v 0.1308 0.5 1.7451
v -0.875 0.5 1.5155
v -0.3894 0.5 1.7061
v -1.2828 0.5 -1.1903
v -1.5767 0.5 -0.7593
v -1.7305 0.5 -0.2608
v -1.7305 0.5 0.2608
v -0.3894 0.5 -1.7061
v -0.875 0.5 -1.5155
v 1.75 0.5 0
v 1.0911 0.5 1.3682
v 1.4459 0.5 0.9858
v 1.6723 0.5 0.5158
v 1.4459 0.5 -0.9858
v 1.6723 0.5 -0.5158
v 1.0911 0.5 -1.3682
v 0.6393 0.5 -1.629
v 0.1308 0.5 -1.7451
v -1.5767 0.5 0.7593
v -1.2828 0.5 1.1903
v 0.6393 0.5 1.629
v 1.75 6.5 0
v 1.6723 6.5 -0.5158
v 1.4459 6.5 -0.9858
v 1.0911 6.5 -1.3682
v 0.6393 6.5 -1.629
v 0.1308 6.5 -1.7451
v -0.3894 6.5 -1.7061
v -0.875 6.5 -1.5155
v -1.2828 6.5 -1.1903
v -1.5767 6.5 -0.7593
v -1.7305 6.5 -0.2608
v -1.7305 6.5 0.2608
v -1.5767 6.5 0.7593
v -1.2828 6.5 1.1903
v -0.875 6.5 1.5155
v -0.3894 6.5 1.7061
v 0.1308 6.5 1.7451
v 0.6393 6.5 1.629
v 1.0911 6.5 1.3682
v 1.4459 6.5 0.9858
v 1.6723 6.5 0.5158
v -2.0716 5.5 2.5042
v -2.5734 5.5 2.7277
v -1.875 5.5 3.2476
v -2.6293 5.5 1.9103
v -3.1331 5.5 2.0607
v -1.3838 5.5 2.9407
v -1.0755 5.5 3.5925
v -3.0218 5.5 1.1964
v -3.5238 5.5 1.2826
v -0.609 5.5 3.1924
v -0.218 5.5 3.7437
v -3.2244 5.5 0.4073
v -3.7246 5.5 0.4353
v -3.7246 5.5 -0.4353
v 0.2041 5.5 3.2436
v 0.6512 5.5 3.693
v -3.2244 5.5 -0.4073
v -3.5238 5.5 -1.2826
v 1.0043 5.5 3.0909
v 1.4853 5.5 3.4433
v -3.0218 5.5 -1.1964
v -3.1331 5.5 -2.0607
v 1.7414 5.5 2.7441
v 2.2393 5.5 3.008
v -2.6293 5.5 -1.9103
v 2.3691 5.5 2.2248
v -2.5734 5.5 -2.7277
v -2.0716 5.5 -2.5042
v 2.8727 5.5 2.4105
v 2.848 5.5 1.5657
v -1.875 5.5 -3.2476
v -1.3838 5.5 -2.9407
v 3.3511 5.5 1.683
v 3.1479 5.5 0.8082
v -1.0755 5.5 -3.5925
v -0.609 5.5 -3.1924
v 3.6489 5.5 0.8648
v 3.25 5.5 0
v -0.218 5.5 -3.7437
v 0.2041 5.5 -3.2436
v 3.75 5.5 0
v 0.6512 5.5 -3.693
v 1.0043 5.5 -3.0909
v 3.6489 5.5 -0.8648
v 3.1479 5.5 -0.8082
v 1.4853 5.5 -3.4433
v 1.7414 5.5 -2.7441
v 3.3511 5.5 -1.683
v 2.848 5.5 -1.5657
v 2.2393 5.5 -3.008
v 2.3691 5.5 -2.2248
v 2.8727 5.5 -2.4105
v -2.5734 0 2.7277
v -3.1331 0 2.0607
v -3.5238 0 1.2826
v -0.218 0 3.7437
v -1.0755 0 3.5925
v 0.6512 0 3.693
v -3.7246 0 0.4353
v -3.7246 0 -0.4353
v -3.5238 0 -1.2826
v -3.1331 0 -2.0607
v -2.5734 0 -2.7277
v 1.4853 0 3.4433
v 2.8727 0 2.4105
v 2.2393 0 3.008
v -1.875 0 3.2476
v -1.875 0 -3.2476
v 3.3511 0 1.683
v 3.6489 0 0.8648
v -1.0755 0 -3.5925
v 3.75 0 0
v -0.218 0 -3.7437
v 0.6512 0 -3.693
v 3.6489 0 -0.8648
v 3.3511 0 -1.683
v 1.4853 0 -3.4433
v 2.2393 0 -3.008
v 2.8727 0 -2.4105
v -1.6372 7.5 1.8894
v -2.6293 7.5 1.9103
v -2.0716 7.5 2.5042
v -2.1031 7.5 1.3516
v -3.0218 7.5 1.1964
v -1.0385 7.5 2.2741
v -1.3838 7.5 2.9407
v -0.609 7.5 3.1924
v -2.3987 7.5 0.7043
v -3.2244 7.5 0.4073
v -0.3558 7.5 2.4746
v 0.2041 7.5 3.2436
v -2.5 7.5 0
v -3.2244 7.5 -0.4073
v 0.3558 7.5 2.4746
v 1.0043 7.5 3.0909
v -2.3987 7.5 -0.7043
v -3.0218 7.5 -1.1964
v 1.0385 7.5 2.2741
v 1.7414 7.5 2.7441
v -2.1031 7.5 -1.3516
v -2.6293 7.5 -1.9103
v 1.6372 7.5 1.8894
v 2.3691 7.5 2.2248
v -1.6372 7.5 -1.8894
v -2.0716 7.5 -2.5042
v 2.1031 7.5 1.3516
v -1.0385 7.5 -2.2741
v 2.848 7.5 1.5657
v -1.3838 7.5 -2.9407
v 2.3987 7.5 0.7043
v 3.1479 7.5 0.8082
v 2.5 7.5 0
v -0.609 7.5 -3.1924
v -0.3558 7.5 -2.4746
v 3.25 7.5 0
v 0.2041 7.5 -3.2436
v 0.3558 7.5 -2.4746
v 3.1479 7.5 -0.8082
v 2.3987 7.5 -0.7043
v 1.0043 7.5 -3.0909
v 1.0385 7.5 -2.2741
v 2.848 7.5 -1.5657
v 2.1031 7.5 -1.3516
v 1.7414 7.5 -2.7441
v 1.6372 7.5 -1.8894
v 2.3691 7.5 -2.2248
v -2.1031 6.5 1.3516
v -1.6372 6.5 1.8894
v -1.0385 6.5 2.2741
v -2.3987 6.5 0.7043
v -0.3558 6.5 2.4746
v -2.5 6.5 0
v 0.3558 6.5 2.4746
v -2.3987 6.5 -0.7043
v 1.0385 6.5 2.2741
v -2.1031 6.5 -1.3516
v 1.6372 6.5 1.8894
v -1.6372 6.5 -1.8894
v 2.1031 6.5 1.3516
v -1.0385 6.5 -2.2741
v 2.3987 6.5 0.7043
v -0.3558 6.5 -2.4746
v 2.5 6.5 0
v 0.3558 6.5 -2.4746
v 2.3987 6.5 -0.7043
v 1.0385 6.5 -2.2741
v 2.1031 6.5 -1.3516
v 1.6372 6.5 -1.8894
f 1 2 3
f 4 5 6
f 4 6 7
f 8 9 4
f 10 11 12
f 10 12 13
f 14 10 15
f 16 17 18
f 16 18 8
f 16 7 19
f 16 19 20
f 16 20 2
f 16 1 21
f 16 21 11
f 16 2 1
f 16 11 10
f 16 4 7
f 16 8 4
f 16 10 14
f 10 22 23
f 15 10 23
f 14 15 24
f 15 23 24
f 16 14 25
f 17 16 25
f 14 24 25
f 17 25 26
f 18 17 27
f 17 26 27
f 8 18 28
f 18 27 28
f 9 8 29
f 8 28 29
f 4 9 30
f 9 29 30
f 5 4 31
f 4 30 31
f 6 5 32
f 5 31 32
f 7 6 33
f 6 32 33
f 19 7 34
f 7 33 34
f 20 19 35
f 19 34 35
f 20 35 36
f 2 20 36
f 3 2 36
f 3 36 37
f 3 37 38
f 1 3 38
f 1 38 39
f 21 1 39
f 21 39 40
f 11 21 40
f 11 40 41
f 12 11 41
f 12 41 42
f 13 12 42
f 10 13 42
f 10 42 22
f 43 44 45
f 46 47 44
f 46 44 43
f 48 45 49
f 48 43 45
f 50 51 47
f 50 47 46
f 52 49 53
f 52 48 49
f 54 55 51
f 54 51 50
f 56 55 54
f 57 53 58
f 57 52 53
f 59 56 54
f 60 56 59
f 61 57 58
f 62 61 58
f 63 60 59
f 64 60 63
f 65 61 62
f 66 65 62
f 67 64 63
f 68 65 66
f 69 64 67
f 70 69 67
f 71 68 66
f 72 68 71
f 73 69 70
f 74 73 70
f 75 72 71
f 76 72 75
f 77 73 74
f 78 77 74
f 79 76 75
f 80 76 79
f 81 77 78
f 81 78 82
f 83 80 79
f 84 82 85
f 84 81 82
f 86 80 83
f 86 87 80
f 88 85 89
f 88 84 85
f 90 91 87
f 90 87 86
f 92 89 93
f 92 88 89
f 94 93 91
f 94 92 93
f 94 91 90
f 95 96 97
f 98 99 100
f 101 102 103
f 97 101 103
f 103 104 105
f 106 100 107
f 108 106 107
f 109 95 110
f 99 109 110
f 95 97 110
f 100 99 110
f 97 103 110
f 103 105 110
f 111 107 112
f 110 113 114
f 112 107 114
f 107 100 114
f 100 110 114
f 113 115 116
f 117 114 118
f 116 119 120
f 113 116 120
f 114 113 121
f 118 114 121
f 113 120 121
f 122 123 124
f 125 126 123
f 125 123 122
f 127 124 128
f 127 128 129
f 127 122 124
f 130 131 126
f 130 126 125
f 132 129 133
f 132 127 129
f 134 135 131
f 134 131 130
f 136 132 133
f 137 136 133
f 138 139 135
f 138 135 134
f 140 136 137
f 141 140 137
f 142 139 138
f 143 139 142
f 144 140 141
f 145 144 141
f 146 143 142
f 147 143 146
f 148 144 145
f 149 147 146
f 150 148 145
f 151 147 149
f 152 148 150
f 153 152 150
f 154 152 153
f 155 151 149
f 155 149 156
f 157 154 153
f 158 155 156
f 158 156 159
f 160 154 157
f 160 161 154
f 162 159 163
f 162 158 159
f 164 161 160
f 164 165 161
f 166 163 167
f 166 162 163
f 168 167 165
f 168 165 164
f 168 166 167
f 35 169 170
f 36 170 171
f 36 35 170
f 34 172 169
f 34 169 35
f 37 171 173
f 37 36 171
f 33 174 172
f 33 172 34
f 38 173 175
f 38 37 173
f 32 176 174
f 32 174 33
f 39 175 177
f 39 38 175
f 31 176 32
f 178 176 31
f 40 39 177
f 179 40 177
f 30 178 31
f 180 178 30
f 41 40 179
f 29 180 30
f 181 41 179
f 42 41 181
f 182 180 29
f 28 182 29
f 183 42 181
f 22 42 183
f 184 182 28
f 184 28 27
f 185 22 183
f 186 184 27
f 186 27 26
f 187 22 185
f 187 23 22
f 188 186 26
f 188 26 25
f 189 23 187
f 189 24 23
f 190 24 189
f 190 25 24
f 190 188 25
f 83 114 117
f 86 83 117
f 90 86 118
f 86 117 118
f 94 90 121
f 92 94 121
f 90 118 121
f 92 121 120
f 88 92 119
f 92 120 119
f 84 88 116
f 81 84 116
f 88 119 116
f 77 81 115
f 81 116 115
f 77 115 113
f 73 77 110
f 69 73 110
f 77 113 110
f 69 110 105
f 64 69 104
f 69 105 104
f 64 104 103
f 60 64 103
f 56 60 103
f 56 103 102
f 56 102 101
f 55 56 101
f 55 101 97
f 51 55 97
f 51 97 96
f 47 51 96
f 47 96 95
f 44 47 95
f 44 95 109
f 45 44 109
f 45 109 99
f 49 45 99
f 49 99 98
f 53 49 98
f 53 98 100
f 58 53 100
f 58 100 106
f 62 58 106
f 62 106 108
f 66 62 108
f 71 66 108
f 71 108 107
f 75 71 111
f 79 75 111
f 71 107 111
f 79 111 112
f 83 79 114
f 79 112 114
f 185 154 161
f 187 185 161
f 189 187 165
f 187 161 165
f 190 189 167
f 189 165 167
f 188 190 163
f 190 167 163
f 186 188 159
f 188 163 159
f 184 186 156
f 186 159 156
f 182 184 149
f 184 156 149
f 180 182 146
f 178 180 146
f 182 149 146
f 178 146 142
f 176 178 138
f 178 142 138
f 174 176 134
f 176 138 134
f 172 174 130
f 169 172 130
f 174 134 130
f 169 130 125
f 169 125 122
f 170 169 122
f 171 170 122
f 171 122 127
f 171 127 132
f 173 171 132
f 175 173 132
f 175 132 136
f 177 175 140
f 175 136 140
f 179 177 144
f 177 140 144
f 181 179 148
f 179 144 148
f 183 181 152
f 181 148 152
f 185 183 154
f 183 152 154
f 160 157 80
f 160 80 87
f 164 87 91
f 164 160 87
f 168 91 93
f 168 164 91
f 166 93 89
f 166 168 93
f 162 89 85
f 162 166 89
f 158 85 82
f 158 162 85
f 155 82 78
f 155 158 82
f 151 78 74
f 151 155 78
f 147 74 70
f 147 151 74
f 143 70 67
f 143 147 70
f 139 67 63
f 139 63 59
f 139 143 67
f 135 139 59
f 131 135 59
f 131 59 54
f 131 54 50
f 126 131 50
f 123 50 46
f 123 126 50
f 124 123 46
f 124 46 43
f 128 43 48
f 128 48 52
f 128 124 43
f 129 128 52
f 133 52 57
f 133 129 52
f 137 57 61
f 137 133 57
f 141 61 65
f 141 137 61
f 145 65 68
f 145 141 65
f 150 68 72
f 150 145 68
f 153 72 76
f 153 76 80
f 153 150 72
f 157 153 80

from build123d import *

# Parameters (mm, degrees)
SKETCH1_R           = 3.75
BOSS_EXTRUDE1_DEPTH = 7.5
SKETCH4_R           = 3.75
SKETCH4_R_2         = 3.25
CUT_EXTRUDE1_DEPTH  = 2
SKETCH5_R           = 1.75
CUT_EXTRUDE2_DEPTH  = 7
SKETCH6_R           = 2.5
CUT_EXTRUDE3_DEPTH  = 1


with BuildPart() as part:
    # Sketch1 → Boss-Extrude1 (new body)
    with BuildSketch(Plane(origin=(0, 0, 0), x_dir=(1, 0, 0), z_dir=(0, 1, 0))):
        Circle(SKETCH1_R)
    extrude(amount=BOSS_EXTRUDE1_DEPTH)

    # Sketch4 → Cut-Extrude1 (cut)
    with BuildSketch(Plane(origin=(0, 7.5, 0), x_dir=(1, 0, 0), z_dir=(0, 1, 0))):
        Circle(SKETCH4_R)
        Circle(SKETCH4_R_2, mode=Mode.SUBTRACT)
    extrude(amount=-CUT_EXTRUDE1_DEPTH, mode=Mode.SUBTRACT)

    # Sketch5 → Cut-Extrude2 (cut)
    with BuildSketch(Plane(origin=(0, 7.5, 0), x_dir=(1, 0, 0), z_dir=(0, 1, 0))):
        Circle(SKETCH5_R)
    extrude(amount=-CUT_EXTRUDE2_DEPTH, mode=Mode.SUBTRACT)

    # Sketch6 → Cut-Extrude3 (cut)
    with BuildSketch(Plane(origin=(0, 7.5, 0), x_dir=(1, 0, 0), z_dir=(0, 1, 0))):
        Circle(SKETCH6_R)
    extrude(amount=-CUT_EXTRUDE3_DEPTH, mode=Mode.SUBTRACT)


solid = part.part
